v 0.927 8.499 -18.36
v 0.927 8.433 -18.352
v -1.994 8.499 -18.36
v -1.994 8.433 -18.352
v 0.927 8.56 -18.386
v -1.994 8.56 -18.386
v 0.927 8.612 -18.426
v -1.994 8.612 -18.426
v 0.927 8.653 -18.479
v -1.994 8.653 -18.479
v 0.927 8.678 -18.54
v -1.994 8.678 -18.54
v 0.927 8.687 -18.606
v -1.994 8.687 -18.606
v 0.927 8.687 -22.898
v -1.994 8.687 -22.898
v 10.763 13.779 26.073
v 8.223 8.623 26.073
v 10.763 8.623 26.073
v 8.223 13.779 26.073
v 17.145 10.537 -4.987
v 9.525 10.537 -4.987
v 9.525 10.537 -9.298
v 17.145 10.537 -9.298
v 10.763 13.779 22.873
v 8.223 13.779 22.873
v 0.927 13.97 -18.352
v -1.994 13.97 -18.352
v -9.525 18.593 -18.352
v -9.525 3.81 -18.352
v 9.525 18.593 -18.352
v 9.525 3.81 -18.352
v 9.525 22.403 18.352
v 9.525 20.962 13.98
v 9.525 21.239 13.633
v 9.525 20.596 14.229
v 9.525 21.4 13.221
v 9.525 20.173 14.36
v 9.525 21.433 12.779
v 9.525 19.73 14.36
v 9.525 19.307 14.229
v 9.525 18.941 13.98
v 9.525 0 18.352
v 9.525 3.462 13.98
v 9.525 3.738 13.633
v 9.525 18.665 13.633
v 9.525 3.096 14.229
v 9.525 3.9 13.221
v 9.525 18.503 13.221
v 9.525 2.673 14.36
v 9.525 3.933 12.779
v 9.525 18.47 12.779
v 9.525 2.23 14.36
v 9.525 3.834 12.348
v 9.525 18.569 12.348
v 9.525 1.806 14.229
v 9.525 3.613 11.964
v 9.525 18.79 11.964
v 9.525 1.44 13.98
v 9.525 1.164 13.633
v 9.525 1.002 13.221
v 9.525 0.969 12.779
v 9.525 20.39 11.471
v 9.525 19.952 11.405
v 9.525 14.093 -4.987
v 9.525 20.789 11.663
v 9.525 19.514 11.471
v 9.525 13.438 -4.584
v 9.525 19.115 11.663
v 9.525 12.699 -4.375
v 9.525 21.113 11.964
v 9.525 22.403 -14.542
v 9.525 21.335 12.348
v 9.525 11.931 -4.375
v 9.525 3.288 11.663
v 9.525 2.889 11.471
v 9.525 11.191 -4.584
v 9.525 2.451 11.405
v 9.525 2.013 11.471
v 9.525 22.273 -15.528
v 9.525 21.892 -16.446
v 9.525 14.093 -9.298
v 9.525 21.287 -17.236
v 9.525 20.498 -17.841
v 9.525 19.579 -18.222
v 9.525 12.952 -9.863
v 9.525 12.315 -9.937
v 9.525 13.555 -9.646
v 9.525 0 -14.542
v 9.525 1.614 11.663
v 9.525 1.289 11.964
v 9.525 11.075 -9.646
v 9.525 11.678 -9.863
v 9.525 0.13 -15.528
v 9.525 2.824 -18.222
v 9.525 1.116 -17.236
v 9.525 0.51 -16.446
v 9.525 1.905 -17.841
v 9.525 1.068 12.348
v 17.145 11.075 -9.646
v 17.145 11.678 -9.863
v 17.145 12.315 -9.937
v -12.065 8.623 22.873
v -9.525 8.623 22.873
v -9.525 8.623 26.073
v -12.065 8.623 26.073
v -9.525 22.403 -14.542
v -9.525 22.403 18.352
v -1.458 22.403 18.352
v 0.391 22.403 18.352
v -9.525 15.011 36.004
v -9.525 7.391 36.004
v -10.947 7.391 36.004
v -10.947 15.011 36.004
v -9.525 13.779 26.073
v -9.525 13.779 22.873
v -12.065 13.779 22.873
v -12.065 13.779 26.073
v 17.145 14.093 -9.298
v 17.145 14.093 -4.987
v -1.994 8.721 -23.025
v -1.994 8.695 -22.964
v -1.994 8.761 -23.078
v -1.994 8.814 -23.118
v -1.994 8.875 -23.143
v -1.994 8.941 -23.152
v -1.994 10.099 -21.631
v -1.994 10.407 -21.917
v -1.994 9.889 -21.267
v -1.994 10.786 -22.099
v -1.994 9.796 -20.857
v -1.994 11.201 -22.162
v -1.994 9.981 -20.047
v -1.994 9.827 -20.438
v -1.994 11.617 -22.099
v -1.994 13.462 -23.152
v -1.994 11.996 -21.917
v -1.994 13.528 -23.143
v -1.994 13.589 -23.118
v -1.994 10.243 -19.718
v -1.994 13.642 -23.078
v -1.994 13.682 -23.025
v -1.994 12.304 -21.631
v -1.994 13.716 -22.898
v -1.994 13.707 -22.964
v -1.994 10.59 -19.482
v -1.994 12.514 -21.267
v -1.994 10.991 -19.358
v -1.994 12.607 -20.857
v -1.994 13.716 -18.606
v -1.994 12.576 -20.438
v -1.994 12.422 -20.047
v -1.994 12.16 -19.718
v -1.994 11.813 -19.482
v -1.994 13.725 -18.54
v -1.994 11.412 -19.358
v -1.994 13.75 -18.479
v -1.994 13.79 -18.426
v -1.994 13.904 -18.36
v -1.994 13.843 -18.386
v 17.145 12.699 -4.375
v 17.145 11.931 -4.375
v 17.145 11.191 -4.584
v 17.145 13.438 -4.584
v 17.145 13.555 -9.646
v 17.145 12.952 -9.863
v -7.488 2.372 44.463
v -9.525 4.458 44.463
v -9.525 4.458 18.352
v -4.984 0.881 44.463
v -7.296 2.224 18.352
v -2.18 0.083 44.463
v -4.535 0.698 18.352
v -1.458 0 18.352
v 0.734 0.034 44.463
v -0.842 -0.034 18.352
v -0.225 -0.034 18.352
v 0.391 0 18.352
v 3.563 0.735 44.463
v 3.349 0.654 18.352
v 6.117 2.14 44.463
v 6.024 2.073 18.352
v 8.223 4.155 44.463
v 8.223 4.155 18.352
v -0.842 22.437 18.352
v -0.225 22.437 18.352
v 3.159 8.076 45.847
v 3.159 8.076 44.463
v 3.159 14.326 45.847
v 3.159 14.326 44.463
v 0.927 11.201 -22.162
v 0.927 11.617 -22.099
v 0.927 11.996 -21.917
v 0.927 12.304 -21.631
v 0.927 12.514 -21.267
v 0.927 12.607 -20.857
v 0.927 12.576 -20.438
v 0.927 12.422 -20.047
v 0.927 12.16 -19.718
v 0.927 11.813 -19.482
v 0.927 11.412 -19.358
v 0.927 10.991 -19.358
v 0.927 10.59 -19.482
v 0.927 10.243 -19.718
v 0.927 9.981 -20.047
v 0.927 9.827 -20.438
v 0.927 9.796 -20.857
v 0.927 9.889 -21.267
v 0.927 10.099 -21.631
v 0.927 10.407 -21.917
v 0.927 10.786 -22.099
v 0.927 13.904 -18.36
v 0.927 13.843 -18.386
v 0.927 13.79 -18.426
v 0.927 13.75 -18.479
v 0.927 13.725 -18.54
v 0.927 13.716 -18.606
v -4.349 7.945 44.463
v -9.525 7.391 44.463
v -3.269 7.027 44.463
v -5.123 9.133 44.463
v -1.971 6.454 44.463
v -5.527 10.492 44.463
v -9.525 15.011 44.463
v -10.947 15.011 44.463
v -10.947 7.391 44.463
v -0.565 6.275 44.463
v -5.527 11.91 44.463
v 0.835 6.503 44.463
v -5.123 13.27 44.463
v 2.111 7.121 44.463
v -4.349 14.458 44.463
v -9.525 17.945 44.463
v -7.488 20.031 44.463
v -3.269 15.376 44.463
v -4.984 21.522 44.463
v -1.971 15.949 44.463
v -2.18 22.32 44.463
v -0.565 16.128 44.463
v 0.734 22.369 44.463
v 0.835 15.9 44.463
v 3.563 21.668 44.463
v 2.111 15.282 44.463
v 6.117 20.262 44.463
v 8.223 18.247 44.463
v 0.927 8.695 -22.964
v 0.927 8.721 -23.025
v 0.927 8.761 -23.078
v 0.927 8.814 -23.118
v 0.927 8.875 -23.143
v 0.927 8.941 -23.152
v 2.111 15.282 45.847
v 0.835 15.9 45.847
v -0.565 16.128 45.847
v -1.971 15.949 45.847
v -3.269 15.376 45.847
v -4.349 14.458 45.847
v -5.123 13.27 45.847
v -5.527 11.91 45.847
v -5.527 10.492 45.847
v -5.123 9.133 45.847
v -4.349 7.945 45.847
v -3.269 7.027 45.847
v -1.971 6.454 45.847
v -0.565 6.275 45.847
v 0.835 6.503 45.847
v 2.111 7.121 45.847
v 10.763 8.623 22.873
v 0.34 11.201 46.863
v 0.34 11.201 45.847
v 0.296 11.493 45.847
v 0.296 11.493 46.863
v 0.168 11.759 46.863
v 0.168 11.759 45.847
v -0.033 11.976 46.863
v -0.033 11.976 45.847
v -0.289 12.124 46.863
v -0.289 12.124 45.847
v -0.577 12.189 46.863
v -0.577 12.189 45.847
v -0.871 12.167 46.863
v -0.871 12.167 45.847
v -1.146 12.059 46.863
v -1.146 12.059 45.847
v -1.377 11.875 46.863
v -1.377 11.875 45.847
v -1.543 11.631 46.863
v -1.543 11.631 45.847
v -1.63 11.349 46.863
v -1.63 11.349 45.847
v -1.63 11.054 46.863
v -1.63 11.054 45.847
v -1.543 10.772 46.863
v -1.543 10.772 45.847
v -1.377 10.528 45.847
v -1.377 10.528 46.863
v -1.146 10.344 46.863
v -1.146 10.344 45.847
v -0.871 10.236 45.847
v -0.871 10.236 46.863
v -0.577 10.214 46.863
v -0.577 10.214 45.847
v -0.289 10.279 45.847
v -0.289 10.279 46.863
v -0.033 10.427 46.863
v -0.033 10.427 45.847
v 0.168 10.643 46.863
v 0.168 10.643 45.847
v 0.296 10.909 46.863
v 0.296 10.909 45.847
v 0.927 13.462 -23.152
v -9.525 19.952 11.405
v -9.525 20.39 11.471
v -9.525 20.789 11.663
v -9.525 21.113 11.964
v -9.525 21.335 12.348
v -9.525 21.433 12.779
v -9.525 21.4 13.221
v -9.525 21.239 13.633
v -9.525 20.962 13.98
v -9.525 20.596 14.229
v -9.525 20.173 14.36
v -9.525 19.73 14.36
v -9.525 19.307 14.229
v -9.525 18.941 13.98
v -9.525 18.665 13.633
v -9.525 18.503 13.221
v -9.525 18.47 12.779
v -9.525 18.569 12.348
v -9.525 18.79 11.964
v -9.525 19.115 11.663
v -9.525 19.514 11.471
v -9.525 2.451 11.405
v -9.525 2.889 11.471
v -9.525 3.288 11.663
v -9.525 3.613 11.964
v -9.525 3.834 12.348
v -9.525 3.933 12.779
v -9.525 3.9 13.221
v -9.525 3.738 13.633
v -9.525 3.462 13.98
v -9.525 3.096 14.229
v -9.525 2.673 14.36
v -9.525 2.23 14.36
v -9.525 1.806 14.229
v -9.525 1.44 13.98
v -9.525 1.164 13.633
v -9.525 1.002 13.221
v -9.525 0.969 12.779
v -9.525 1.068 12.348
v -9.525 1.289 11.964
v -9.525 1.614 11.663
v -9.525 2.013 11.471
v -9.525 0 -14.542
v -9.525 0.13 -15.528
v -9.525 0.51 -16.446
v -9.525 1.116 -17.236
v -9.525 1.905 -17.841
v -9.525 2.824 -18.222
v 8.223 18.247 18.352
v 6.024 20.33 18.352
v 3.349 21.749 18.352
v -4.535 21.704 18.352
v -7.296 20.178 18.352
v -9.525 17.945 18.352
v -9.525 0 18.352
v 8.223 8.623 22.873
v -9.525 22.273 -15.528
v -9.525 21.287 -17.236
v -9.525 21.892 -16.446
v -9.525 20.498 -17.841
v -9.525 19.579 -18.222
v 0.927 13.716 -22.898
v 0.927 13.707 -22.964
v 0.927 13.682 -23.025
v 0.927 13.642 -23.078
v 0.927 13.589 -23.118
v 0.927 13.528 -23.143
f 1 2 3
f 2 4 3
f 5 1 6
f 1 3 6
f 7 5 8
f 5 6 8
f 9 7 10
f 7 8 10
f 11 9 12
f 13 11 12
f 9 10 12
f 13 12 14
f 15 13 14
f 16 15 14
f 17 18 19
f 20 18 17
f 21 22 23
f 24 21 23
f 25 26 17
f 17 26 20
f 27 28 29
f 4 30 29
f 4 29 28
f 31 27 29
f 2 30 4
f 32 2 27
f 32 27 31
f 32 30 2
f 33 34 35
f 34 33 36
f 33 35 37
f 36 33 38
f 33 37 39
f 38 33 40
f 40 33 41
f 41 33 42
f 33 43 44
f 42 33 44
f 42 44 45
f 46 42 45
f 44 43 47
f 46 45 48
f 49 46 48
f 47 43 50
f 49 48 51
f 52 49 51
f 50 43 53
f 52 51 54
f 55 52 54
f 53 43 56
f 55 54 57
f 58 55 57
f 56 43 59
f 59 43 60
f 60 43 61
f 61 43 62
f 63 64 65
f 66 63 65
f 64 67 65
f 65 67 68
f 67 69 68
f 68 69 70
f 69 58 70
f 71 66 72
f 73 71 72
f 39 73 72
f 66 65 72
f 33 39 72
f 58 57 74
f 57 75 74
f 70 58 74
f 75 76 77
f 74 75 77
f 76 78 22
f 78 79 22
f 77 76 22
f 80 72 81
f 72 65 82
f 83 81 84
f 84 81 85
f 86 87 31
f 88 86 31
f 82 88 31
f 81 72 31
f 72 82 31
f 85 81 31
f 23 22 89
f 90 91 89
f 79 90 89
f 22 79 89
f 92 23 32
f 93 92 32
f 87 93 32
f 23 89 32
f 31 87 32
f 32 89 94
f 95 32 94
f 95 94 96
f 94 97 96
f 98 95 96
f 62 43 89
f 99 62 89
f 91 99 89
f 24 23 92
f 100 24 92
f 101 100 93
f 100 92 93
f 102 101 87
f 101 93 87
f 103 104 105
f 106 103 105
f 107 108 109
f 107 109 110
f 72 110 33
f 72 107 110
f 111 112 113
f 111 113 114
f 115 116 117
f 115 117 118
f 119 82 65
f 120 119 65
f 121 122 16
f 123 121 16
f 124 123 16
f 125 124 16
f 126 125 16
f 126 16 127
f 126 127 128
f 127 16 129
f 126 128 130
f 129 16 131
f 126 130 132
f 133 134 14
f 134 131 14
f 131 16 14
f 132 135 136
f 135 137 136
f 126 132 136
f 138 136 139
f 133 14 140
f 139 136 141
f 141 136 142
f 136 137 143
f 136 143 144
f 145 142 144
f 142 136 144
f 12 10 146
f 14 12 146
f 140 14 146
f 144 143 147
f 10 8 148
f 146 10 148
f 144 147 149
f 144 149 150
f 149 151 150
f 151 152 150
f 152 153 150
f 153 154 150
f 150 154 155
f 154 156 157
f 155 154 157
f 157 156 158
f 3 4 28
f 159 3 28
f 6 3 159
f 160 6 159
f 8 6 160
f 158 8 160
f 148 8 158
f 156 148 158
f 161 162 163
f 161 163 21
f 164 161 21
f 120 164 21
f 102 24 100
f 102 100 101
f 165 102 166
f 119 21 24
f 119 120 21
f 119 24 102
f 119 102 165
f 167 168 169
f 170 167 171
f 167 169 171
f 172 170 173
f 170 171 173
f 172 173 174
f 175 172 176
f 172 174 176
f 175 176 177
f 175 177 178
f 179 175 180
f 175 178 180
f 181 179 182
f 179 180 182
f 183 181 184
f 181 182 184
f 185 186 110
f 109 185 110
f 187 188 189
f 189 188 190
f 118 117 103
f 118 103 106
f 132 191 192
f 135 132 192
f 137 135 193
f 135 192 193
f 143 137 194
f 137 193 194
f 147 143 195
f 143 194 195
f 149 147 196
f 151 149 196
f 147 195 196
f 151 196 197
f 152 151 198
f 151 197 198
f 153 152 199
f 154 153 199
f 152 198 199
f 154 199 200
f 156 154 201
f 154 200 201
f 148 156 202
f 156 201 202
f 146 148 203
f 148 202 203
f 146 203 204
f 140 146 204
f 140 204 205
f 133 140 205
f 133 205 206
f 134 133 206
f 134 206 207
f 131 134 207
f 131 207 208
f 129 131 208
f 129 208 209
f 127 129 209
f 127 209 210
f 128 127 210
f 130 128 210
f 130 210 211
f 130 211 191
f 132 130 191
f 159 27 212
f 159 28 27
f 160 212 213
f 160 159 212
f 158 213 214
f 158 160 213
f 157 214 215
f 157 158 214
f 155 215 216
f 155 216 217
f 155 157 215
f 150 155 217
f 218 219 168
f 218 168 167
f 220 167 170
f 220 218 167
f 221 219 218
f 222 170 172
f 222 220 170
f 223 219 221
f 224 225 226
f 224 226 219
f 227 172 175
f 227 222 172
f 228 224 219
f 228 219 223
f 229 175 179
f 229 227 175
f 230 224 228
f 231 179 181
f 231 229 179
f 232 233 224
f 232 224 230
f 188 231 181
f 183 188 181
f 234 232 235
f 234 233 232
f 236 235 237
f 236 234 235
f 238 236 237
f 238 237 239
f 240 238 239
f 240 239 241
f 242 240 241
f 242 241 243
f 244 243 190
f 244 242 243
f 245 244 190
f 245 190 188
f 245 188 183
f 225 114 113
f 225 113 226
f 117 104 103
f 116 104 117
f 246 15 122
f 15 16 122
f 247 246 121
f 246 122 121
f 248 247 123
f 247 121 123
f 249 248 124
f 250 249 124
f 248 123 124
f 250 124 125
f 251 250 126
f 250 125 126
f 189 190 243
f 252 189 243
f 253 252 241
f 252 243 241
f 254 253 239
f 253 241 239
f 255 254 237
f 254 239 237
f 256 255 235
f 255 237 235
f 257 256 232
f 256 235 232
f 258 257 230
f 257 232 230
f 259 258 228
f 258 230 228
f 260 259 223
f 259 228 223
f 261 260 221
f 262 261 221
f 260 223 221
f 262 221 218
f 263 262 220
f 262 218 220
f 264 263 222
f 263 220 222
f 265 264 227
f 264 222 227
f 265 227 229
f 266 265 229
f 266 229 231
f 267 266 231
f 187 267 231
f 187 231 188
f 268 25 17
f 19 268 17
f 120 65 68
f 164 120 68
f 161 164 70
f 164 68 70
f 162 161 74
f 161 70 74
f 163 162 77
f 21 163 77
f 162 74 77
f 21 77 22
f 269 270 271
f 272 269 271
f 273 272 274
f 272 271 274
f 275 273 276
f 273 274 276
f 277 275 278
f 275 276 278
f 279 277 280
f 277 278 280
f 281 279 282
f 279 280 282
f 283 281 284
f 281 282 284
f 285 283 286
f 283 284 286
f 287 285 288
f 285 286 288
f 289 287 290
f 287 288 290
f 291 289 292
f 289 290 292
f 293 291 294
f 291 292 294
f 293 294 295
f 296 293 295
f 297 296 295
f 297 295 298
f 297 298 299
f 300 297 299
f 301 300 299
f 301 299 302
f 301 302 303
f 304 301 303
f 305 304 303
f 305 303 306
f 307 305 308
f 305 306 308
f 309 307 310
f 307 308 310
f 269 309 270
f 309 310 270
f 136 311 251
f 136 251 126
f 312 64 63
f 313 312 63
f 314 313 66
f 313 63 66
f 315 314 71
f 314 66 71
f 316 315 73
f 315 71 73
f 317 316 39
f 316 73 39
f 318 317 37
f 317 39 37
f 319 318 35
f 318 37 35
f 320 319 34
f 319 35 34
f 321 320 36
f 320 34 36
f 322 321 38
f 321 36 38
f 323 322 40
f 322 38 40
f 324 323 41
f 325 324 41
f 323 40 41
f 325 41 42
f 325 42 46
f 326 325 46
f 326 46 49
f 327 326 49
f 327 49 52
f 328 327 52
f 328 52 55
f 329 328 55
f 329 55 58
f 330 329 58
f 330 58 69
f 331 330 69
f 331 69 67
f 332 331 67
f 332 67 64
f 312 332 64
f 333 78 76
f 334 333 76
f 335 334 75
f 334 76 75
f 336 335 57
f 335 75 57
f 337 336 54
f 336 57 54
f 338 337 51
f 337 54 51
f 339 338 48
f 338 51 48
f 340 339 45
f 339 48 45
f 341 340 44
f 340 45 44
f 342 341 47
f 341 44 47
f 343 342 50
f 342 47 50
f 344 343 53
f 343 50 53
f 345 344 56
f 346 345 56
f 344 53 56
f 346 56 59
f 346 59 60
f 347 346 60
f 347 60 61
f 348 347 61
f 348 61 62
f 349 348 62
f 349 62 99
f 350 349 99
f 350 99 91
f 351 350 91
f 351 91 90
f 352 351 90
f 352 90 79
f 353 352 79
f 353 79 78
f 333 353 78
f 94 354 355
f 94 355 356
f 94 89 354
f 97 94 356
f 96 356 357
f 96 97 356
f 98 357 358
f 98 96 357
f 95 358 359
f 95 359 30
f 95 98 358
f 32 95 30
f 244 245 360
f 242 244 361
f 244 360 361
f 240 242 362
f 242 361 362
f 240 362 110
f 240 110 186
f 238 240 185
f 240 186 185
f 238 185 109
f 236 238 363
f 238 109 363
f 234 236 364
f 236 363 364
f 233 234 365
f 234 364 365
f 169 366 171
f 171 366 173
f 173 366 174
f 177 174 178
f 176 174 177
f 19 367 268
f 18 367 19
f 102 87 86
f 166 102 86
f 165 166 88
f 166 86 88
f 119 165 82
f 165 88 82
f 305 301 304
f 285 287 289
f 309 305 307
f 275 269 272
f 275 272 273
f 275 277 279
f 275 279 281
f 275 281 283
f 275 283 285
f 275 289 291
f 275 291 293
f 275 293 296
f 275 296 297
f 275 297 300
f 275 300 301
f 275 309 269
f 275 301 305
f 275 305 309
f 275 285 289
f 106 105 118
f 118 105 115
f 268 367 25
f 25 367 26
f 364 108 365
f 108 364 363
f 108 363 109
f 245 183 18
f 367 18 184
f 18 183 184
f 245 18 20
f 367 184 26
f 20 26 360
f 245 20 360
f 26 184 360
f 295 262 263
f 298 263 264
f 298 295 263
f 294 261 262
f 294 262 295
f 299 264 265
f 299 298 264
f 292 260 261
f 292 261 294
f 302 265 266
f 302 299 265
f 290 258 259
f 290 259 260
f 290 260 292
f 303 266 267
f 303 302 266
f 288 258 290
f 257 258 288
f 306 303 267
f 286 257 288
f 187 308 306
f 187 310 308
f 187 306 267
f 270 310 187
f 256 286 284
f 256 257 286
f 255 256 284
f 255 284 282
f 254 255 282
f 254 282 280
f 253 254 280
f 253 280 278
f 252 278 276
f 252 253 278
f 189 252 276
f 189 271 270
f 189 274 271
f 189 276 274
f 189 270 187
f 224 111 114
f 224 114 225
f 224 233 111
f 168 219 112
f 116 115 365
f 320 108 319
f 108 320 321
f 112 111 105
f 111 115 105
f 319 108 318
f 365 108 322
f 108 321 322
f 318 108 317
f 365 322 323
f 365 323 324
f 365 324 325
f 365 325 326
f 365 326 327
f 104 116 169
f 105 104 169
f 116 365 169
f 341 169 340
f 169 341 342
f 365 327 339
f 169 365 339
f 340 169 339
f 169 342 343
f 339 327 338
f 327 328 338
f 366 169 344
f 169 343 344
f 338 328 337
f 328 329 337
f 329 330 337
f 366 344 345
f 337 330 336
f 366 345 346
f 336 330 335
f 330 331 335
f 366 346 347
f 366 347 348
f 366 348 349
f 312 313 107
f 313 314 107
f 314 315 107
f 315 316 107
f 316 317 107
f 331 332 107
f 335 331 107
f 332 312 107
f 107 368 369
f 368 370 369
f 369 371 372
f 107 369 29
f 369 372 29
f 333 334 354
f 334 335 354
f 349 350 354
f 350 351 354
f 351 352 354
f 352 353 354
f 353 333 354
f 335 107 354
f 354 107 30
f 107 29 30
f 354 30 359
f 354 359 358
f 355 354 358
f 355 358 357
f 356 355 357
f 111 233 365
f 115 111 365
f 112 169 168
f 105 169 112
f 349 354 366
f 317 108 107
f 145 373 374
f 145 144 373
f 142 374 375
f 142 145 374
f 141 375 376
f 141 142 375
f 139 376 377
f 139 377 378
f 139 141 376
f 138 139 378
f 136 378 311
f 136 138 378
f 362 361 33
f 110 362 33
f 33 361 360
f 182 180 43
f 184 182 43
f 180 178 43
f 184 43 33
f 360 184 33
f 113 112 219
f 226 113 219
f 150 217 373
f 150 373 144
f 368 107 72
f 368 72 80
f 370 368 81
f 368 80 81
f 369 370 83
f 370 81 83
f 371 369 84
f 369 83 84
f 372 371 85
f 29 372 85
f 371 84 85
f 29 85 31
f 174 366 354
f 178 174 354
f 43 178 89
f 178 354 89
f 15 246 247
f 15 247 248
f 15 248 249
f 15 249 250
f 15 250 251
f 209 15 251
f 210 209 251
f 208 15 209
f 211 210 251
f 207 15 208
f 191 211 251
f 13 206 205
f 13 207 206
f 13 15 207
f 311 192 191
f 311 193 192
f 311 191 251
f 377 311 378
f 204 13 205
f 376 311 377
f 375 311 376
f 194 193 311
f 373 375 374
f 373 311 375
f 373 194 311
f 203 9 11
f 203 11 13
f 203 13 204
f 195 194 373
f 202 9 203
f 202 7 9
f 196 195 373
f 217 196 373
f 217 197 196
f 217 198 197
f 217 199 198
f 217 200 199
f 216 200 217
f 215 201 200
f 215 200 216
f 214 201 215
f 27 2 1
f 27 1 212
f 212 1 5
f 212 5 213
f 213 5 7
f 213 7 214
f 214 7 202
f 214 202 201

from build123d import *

# Parameters (mm, degrees)
SKETCH1_W           = 19.05
SKETCH1_H           = 36.703
BOSS_EXTRUDE1_DEPTH = 22.4028
BOSS_EXTRUDE2_DEPTH = 7.62
SKETCH3_R           = 1.4859
CUT_EXTRUDE1_DEPTH  = 20.05
FILLET1_R           = 3.81
SKETCH6_W           = 2.921
SKETCH6_H           = 5.0292
BOSS_EXTRUDE3_DEPTH = 4.8006
FILLET2_R           = 0.254
SKETCH7_R           = 1.4097
CUT_EXTRUDE2_DEPTH  = 11.4521
BOSS_EXTRUDE4_DEPTH = 26.1112
SKETCH11_W          = 3.2004
SKETCH11_H          = 5.1562
BOSS_EXTRUDE5_DEPTH = 2.54
SKETCH12_W          = 8.4582
SKETCH12_H          = 7.62
BOSS_EXTRUDE6_DEPTH = 1.4224
BOSS_EXTRUDE7_DEPTH = 1.3843
SKETCH14_R          = 0.9906
BOSS_EXTRUDE8_DEPTH = 1.016


with BuildPart() as part:
    # Sketch1 → Boss-Extrude1 (new body)
    with BuildSketch(Plane(origin=(0, 0, 0), x_dir=(1, 0, 0), z_dir=(0, 1, 0))):
        Rectangle(SKETCH1_W, SKETCH1_H)
    extrude(amount=BOSS_EXTRUDE1_DEPTH)

    # Sketch2 → Boss-Extrude2 (add)
    with BuildSketch(Plane(origin=(9.525, 0, 0), x_dir=(0, 0, -1), z_dir=(1, 0, 0))):
        with BuildLine():
            Line((9.297778198, 14.092814896), (4.98725526, 14.092814896))
            ThreePointArc((4.98725526, 14.092814896), (4.348516729, 12.314814896), (4.98725526, 10.536814896))
            Line((4.98725526, 10.536814896), (9.297778198, 10.536814896))
            ThreePointArc((9.297778198, 10.536814896), (9.771987831, 11.370189188), (9.936516729, 12.314814896))
            ThreePointArc((9.936516729, 12.314814896), (9.771987831, 13.259440604), (9.297778198, 14.092814896))
        make_face()
    extrude(amount=BOSS_EXTRUDE2_DEPTH)

    # Sketch3 → Cut-Extrude1 (cut, through all)
    with BuildSketch(Plane(origin=(9.525, 0, 0), x_dir=(0, 0, -1), z_dir=(1, 0, 0))):
        with Locations((-12.8905, 19.9517)):
            Circle(SKETCH3_R)
        with Locations((-12.8905, 2.4511)):
            Circle(SKETCH3_R)
    extrude(amount=-CUT_EXTRUDE1_DEPTH, mode=Mode.SUBTRACT)

    # Fillet1
    fillet1_edges = [part.edges().sort_by_distance(p)[0] for p in [
        (0, 22.4028, -18.3515),
        (0, 0, -18.3515),
    ]]
    fillet(fillet1_edges, radius=FILLET1_R)

    # Sketch6 → Boss-Extrude3 (add)
    with BuildSketch(Plane(origin=(0, 0, -18.3515), x_dir=(-1, 0, 0), z_dir=(0, 0, -1))):
        with Locations((0.5334, 11.2014)):
            Rectangle(SKETCH6_W, SKETCH6_H)
    extrude(amount=BOSS_EXTRUDE3_DEPTH)

    # Fillet2
    fillet2_edges = [part.edges().sort_by_distance(p)[0] for p in [
        (-0.5334, 8.6868, -18.3515),
        (-0.5334, 13.716, -18.3515),
        (-0.5334, 8.6868, -23.1521),
        (-0.5334, 13.716, -23.1521),
    ]]
    fillet(fillet2_edges, radius=FILLET2_R)

    # Sketch7 → Cut-Extrude2 (cut, through all)
    with BuildSketch(Plane(origin=(0.9271, 0, 0), x_dir=(0, 0, -1), z_dir=(1, 0, 0))):
        with Locations((20.7518, 11.2014)):
            Circle(SKETCH7_R)
    extrude(amount=-CUT_EXTRUDE2_DEPTH, mode=Mode.SUBTRACT)

    # Sketch8 → Boss-Extrude4 (add)
    with BuildSketch(Plane.XY.offset(18.3515)):
        with BuildLine():
            Line((-9.525, 17.9451), (-9.525, 4.4577))
            ThreePointArc((-9.525, 4.4577), (-0.724870396, -0.036468986), (8.22325, 4.155305974))
            Line((8.22325, 4.155305974), (8.22325, 18.247494026))
            ThreePointArc((8.22325, 18.247494026), (-0.724870396, 22.439268986), (-9.525, 17.9451))
        make_face()
    extrude(amount=BOSS_EXTRUDE4_DEPTH)

    # Sketch11 → Boss-Extrude5 (add)
    with BuildSketch(Plane.ZY.offset(9.525)):
        with Locations((24.4729, 11.2014)):
            Rectangle(SKETCH11_W, SKETCH11_H)
    boss_extrude5 = extrude(amount=BOSS_EXTRUDE5_DEPTH)

    # Mirror1: Boss-Extrude5 across plane
    add(boss_extrude5.mirror(Plane(origin=(-0.650875, 0, 0), x_dir=(0, 0, 1), z_dir=(1, 0, 0))))

    # Sketch12 → Boss-Extrude6 (add)
    with BuildSketch(Plane.ZY.offset(9.525)):
        with Locations((40.2336, 11.2014)):
            Rectangle(SKETCH12_W, SKETCH12_H)
    extrude(amount=BOSS_EXTRUDE6_DEPTH)

    # Sketch13 → Boss-Extrude7 (add)
    with BuildSketch(Plane.XY.offset(44.4627)):
        with BuildLine():
            Line((3.159125, 8.076477319), (3.159125, 14.326322681))
            ThreePointArc((3.159125, 14.326322681), (-5.578475, 11.2014), (3.159125, 8.076477319))
        make_face()
    extrude(amount=BOSS_EXTRUDE7_DEPTH)

    # Sketch14 → Boss-Extrude8 (add)
    with BuildSketch(Plane.XY.offset(45.847)):
        with Locations((-0.650875, 11.2014)):
            Circle(SKETCH14_R)
    extrude(amount=BOSS_EXTRUDE8_DEPTH)


solid = part.part
